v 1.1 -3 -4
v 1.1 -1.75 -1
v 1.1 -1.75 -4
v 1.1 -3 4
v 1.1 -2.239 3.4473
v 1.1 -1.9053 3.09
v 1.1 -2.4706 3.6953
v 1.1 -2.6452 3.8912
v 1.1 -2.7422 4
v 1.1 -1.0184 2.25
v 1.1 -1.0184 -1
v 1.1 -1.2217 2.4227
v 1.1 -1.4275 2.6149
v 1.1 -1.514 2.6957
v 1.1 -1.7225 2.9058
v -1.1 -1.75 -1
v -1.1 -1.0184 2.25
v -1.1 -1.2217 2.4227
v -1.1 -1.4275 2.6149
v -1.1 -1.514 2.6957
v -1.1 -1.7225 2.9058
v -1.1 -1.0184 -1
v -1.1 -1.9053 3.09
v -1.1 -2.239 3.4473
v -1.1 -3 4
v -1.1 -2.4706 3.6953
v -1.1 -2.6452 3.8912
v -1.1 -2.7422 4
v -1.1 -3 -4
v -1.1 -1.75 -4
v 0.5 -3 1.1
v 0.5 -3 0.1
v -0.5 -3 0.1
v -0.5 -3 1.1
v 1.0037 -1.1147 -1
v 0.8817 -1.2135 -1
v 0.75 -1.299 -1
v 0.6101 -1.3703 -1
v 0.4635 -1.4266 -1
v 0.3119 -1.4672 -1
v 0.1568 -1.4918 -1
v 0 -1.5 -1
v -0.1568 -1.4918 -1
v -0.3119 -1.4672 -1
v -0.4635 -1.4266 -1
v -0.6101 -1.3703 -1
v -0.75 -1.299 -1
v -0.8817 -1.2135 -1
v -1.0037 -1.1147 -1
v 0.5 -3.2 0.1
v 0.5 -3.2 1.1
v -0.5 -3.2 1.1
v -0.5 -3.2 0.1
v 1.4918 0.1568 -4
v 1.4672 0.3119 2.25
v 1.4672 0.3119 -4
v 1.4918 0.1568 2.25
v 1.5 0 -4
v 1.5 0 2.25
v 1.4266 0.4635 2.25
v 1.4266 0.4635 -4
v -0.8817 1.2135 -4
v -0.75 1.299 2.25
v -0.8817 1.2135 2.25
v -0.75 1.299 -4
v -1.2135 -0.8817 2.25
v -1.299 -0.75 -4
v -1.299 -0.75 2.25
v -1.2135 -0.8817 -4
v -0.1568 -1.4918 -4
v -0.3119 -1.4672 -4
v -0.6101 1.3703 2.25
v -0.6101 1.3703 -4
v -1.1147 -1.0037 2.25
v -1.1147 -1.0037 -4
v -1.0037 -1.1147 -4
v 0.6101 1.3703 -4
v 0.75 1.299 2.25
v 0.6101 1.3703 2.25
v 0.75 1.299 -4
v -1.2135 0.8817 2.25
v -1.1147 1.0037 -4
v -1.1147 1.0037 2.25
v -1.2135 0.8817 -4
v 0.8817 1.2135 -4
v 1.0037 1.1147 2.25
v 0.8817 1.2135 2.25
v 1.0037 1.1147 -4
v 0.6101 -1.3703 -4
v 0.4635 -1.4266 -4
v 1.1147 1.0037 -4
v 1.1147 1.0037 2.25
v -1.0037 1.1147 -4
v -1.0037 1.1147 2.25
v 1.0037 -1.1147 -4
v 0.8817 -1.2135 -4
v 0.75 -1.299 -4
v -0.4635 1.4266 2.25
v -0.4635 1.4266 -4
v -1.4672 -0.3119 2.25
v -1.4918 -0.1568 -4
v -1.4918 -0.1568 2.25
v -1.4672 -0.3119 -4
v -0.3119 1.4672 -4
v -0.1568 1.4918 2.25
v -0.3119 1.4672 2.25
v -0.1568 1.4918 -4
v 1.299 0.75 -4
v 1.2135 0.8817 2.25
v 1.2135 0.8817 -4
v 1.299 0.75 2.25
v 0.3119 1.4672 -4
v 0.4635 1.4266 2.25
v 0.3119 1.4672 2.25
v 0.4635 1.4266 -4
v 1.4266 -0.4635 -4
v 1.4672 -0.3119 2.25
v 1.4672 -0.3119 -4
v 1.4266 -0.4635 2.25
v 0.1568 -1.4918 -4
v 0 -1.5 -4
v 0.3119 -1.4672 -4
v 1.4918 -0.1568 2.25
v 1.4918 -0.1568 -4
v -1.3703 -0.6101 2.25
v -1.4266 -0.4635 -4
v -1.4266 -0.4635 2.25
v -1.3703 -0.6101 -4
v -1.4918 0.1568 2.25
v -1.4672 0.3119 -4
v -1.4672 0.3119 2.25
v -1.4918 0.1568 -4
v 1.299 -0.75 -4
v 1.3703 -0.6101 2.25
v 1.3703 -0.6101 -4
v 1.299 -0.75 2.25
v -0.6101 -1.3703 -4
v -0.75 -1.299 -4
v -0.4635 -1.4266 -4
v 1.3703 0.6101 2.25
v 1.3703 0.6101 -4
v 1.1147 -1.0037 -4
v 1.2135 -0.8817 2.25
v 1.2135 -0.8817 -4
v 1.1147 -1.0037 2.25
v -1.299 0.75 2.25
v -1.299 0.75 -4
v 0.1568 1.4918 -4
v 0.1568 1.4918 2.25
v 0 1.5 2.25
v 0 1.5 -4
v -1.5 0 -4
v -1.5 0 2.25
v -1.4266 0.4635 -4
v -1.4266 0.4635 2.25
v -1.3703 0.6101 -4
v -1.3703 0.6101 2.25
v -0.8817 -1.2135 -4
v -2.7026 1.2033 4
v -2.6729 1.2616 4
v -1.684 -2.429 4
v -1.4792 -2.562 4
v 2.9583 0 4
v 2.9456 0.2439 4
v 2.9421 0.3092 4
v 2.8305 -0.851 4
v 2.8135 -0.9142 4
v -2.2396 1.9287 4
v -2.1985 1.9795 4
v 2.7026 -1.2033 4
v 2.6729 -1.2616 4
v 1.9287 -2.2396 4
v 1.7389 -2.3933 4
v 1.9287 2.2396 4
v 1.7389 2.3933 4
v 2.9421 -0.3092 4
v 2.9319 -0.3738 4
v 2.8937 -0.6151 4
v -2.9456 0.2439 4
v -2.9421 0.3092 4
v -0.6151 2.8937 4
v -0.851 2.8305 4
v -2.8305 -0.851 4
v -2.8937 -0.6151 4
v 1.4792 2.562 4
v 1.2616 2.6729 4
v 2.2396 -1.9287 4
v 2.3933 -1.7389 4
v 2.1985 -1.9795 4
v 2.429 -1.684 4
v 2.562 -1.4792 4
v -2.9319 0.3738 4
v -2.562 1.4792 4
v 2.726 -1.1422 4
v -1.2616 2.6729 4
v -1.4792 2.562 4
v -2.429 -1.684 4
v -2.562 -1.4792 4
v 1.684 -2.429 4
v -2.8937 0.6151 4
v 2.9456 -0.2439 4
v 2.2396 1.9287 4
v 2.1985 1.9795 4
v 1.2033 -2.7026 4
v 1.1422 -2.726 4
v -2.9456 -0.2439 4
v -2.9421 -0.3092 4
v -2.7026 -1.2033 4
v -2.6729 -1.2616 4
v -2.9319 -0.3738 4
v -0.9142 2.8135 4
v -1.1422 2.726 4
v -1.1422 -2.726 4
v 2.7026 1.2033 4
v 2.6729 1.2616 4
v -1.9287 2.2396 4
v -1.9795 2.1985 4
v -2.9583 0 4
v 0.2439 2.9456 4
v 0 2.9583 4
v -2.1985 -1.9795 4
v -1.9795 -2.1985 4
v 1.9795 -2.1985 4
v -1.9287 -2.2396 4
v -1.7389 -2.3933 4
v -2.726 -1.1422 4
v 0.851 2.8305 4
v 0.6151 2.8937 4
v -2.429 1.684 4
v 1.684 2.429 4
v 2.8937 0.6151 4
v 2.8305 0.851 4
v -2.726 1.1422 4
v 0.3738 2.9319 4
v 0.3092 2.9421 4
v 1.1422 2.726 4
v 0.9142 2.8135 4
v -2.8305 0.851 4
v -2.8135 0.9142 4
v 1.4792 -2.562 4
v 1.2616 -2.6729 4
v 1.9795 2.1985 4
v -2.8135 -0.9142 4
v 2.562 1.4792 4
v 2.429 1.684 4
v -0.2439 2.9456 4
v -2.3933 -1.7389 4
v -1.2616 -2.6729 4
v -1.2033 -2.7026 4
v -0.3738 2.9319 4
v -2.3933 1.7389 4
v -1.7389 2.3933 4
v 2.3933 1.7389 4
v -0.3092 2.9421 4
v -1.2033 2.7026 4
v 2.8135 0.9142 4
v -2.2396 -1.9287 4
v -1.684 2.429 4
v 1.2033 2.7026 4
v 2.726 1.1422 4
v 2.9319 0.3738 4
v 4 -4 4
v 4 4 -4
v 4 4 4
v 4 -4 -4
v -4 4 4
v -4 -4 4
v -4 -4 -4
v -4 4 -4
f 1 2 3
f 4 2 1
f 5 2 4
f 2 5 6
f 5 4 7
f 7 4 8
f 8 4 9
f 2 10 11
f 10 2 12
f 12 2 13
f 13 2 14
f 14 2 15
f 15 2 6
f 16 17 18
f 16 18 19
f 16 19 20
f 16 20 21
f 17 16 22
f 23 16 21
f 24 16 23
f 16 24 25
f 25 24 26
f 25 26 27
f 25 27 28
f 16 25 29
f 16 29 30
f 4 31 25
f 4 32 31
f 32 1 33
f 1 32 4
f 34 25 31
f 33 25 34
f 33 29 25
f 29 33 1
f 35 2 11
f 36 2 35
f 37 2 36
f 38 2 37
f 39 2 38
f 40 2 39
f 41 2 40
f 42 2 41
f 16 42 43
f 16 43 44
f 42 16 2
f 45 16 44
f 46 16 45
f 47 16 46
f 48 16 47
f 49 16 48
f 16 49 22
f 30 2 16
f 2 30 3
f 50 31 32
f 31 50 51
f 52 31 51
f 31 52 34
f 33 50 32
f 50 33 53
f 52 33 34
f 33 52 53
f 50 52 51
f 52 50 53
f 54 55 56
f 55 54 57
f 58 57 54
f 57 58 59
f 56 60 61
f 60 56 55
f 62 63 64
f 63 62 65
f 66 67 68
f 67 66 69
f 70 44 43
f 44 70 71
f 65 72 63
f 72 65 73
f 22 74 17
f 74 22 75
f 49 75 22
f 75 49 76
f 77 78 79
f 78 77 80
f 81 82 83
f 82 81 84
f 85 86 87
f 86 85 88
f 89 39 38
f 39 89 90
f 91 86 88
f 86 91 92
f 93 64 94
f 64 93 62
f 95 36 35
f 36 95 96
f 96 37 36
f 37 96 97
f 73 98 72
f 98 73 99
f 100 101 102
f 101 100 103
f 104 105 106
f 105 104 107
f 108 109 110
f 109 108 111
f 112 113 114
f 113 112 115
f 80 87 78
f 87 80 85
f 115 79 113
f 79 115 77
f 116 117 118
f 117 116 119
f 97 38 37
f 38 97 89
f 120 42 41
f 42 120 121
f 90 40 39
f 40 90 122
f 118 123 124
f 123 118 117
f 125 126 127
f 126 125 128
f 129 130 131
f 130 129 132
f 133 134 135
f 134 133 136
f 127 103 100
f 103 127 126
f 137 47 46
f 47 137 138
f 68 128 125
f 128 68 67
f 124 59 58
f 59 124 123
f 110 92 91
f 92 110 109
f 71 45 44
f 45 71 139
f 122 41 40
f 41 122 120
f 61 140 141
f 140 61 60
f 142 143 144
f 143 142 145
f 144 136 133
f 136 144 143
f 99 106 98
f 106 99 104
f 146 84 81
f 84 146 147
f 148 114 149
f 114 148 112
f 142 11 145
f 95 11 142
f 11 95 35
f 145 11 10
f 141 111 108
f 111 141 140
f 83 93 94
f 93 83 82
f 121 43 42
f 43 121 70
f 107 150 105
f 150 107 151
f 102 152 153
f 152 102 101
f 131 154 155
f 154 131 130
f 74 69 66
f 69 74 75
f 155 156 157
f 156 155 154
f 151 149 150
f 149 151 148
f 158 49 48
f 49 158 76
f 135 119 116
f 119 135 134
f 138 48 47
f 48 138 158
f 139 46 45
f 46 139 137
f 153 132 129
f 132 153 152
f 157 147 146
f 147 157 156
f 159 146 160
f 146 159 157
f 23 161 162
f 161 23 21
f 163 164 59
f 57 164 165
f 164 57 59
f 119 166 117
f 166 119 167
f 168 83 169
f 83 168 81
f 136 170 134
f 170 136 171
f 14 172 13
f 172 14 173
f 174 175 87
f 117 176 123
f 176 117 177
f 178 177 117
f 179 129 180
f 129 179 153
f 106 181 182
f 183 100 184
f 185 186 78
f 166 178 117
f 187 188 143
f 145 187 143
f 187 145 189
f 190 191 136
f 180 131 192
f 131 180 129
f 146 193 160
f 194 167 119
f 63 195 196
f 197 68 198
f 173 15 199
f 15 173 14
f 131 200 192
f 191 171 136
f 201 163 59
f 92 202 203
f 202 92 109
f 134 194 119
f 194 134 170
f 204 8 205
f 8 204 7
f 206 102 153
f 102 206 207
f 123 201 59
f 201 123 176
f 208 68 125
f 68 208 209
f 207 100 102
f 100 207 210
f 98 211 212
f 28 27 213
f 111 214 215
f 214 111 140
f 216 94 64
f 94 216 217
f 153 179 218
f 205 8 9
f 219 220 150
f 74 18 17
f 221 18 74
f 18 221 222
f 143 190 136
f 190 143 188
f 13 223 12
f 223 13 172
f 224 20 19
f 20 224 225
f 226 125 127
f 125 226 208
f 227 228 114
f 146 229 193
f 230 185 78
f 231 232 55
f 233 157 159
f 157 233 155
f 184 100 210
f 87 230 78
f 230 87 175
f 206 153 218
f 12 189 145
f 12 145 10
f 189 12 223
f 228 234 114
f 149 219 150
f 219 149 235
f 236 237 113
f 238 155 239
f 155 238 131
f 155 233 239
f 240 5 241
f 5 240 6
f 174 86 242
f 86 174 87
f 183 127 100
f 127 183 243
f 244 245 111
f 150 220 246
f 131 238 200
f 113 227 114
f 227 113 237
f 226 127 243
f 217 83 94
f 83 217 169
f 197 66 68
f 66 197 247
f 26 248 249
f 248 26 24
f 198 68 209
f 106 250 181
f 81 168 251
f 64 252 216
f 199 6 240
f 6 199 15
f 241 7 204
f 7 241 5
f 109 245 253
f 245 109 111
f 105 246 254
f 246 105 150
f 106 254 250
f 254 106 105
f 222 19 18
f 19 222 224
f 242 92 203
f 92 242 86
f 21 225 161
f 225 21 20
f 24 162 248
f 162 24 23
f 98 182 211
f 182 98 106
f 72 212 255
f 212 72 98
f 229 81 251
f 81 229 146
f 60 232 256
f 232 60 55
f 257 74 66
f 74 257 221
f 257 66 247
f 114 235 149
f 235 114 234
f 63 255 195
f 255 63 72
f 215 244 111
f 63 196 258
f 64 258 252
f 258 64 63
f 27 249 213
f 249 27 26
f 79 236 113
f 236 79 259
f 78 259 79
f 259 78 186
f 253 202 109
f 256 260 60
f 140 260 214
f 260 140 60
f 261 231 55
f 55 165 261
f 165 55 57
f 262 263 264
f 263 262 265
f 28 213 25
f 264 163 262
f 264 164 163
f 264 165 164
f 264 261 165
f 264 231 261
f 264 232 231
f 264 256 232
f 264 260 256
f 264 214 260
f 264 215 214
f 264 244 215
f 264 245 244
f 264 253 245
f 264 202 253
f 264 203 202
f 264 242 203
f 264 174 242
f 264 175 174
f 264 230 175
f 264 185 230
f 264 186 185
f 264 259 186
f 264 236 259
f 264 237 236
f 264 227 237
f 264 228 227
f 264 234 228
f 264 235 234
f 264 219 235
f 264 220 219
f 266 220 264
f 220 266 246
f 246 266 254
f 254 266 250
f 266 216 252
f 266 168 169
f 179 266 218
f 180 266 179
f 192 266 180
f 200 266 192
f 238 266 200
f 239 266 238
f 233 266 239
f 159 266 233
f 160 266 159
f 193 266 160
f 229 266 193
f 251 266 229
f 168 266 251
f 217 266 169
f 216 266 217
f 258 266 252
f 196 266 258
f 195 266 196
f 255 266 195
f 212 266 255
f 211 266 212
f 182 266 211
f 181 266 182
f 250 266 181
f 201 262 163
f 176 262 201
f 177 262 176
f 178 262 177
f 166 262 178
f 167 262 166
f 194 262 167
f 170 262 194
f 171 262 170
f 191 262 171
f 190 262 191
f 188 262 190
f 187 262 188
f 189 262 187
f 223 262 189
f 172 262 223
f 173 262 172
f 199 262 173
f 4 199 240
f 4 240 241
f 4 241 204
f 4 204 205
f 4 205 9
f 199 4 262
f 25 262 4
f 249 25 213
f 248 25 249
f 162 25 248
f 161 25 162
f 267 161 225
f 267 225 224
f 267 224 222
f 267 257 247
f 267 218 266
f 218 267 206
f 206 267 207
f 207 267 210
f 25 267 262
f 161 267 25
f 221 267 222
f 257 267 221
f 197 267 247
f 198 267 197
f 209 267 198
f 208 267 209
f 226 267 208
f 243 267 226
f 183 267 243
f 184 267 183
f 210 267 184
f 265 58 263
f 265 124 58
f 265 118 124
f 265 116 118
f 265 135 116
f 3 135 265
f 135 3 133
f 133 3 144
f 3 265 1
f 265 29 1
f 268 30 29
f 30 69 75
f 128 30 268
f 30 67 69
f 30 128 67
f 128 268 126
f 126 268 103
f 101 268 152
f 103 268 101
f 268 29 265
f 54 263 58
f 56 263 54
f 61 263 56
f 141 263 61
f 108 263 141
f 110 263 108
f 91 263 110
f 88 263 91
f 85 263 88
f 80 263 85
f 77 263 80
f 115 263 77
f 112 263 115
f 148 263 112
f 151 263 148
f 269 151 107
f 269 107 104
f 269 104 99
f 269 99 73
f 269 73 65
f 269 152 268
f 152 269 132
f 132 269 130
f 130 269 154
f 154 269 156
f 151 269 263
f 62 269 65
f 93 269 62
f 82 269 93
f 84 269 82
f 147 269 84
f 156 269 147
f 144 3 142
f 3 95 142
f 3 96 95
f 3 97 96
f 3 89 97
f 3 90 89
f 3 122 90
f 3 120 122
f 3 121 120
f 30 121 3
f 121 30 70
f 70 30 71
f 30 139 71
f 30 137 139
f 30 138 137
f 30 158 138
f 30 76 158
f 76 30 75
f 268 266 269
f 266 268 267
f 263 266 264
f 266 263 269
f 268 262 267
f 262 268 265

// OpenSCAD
$fn = 60;

module make_pin() {
	r_pin_circle = 28.0;
	alpha = 26.75;

	for (j=[-1,1])
		for (i=[-2:1:2])
			translate([r_pin_circle * sin(i * alpha), j * r_pin_circle * cos(i * alpha), 0])
				children();
}

module make_pin2() {
	for (i=[-1, 1])
		for (j=[-1,1]) {
			translate([0, 28 * j, 0])
				children();

			translate([12.5 * i, 25.0 * j, 0])
				children();

			translate([22.53 * i, 16.6 * j, 0])
				children();
		}
}

module contact() {
	rotate([0, 90, 0])
		linear_extrude(1.5, center=true)
			translate([-0.7, -1.25, 0])
				import("spring.svg");
}

module pin() {
	translate([0, 0, -3])
		cylinder(h=6, d1=3, d2=2.25, center=true);

	translate([0, 0, 3])
		cylinder(h=6, d2=3, d1=2.25, center=true);
}

module pocket() {
	difference() {
		translate([0, -2, 0])
			cube(size=[2.2, 2, 10], center=true);
		translate([0, -1.0, -3])
			cube(size=[3, 1.5, 4], center=true);
	}
	translate([0, -1.6 - 0.6, 0.6])
		cube(size=[1, 2, 1], center=true);
	cylinder(h=10, d=3, center=true);

	translate([0, 0, 3.75])
		cylinder(h=3, d1=3, d2=8, center=true);
}

// cylinder(h=20, d=43, center=true);
// make_pin()
// 	cylinder(h=16, d=2, center=true);

// color("red")
// 	translate([0, -2.85, 4])
// 		contact();

intersection() {
	difference() {
		cube(size=[8, 8, 8], center=true);
		pocket();
	}
	// translate([50, 0, 0])
	// 	cube(size=[100, 100, 100], center=true);
}

// pin();

// cylinder(h=20, d=10.5, center=true);
// translate([0, -5.5, 0])
// 	cylinder(h=20, d=2, center=true);
// translate([0, -4.5, 0])
// 	cube(size=[2, 2, 20], center=true);


// color("red")
// 	make_pin()
// 		cylinder(h=16, d=3, center=true);

// make_pin2()
// 	cylinder(h=16, d=3, center=true);
